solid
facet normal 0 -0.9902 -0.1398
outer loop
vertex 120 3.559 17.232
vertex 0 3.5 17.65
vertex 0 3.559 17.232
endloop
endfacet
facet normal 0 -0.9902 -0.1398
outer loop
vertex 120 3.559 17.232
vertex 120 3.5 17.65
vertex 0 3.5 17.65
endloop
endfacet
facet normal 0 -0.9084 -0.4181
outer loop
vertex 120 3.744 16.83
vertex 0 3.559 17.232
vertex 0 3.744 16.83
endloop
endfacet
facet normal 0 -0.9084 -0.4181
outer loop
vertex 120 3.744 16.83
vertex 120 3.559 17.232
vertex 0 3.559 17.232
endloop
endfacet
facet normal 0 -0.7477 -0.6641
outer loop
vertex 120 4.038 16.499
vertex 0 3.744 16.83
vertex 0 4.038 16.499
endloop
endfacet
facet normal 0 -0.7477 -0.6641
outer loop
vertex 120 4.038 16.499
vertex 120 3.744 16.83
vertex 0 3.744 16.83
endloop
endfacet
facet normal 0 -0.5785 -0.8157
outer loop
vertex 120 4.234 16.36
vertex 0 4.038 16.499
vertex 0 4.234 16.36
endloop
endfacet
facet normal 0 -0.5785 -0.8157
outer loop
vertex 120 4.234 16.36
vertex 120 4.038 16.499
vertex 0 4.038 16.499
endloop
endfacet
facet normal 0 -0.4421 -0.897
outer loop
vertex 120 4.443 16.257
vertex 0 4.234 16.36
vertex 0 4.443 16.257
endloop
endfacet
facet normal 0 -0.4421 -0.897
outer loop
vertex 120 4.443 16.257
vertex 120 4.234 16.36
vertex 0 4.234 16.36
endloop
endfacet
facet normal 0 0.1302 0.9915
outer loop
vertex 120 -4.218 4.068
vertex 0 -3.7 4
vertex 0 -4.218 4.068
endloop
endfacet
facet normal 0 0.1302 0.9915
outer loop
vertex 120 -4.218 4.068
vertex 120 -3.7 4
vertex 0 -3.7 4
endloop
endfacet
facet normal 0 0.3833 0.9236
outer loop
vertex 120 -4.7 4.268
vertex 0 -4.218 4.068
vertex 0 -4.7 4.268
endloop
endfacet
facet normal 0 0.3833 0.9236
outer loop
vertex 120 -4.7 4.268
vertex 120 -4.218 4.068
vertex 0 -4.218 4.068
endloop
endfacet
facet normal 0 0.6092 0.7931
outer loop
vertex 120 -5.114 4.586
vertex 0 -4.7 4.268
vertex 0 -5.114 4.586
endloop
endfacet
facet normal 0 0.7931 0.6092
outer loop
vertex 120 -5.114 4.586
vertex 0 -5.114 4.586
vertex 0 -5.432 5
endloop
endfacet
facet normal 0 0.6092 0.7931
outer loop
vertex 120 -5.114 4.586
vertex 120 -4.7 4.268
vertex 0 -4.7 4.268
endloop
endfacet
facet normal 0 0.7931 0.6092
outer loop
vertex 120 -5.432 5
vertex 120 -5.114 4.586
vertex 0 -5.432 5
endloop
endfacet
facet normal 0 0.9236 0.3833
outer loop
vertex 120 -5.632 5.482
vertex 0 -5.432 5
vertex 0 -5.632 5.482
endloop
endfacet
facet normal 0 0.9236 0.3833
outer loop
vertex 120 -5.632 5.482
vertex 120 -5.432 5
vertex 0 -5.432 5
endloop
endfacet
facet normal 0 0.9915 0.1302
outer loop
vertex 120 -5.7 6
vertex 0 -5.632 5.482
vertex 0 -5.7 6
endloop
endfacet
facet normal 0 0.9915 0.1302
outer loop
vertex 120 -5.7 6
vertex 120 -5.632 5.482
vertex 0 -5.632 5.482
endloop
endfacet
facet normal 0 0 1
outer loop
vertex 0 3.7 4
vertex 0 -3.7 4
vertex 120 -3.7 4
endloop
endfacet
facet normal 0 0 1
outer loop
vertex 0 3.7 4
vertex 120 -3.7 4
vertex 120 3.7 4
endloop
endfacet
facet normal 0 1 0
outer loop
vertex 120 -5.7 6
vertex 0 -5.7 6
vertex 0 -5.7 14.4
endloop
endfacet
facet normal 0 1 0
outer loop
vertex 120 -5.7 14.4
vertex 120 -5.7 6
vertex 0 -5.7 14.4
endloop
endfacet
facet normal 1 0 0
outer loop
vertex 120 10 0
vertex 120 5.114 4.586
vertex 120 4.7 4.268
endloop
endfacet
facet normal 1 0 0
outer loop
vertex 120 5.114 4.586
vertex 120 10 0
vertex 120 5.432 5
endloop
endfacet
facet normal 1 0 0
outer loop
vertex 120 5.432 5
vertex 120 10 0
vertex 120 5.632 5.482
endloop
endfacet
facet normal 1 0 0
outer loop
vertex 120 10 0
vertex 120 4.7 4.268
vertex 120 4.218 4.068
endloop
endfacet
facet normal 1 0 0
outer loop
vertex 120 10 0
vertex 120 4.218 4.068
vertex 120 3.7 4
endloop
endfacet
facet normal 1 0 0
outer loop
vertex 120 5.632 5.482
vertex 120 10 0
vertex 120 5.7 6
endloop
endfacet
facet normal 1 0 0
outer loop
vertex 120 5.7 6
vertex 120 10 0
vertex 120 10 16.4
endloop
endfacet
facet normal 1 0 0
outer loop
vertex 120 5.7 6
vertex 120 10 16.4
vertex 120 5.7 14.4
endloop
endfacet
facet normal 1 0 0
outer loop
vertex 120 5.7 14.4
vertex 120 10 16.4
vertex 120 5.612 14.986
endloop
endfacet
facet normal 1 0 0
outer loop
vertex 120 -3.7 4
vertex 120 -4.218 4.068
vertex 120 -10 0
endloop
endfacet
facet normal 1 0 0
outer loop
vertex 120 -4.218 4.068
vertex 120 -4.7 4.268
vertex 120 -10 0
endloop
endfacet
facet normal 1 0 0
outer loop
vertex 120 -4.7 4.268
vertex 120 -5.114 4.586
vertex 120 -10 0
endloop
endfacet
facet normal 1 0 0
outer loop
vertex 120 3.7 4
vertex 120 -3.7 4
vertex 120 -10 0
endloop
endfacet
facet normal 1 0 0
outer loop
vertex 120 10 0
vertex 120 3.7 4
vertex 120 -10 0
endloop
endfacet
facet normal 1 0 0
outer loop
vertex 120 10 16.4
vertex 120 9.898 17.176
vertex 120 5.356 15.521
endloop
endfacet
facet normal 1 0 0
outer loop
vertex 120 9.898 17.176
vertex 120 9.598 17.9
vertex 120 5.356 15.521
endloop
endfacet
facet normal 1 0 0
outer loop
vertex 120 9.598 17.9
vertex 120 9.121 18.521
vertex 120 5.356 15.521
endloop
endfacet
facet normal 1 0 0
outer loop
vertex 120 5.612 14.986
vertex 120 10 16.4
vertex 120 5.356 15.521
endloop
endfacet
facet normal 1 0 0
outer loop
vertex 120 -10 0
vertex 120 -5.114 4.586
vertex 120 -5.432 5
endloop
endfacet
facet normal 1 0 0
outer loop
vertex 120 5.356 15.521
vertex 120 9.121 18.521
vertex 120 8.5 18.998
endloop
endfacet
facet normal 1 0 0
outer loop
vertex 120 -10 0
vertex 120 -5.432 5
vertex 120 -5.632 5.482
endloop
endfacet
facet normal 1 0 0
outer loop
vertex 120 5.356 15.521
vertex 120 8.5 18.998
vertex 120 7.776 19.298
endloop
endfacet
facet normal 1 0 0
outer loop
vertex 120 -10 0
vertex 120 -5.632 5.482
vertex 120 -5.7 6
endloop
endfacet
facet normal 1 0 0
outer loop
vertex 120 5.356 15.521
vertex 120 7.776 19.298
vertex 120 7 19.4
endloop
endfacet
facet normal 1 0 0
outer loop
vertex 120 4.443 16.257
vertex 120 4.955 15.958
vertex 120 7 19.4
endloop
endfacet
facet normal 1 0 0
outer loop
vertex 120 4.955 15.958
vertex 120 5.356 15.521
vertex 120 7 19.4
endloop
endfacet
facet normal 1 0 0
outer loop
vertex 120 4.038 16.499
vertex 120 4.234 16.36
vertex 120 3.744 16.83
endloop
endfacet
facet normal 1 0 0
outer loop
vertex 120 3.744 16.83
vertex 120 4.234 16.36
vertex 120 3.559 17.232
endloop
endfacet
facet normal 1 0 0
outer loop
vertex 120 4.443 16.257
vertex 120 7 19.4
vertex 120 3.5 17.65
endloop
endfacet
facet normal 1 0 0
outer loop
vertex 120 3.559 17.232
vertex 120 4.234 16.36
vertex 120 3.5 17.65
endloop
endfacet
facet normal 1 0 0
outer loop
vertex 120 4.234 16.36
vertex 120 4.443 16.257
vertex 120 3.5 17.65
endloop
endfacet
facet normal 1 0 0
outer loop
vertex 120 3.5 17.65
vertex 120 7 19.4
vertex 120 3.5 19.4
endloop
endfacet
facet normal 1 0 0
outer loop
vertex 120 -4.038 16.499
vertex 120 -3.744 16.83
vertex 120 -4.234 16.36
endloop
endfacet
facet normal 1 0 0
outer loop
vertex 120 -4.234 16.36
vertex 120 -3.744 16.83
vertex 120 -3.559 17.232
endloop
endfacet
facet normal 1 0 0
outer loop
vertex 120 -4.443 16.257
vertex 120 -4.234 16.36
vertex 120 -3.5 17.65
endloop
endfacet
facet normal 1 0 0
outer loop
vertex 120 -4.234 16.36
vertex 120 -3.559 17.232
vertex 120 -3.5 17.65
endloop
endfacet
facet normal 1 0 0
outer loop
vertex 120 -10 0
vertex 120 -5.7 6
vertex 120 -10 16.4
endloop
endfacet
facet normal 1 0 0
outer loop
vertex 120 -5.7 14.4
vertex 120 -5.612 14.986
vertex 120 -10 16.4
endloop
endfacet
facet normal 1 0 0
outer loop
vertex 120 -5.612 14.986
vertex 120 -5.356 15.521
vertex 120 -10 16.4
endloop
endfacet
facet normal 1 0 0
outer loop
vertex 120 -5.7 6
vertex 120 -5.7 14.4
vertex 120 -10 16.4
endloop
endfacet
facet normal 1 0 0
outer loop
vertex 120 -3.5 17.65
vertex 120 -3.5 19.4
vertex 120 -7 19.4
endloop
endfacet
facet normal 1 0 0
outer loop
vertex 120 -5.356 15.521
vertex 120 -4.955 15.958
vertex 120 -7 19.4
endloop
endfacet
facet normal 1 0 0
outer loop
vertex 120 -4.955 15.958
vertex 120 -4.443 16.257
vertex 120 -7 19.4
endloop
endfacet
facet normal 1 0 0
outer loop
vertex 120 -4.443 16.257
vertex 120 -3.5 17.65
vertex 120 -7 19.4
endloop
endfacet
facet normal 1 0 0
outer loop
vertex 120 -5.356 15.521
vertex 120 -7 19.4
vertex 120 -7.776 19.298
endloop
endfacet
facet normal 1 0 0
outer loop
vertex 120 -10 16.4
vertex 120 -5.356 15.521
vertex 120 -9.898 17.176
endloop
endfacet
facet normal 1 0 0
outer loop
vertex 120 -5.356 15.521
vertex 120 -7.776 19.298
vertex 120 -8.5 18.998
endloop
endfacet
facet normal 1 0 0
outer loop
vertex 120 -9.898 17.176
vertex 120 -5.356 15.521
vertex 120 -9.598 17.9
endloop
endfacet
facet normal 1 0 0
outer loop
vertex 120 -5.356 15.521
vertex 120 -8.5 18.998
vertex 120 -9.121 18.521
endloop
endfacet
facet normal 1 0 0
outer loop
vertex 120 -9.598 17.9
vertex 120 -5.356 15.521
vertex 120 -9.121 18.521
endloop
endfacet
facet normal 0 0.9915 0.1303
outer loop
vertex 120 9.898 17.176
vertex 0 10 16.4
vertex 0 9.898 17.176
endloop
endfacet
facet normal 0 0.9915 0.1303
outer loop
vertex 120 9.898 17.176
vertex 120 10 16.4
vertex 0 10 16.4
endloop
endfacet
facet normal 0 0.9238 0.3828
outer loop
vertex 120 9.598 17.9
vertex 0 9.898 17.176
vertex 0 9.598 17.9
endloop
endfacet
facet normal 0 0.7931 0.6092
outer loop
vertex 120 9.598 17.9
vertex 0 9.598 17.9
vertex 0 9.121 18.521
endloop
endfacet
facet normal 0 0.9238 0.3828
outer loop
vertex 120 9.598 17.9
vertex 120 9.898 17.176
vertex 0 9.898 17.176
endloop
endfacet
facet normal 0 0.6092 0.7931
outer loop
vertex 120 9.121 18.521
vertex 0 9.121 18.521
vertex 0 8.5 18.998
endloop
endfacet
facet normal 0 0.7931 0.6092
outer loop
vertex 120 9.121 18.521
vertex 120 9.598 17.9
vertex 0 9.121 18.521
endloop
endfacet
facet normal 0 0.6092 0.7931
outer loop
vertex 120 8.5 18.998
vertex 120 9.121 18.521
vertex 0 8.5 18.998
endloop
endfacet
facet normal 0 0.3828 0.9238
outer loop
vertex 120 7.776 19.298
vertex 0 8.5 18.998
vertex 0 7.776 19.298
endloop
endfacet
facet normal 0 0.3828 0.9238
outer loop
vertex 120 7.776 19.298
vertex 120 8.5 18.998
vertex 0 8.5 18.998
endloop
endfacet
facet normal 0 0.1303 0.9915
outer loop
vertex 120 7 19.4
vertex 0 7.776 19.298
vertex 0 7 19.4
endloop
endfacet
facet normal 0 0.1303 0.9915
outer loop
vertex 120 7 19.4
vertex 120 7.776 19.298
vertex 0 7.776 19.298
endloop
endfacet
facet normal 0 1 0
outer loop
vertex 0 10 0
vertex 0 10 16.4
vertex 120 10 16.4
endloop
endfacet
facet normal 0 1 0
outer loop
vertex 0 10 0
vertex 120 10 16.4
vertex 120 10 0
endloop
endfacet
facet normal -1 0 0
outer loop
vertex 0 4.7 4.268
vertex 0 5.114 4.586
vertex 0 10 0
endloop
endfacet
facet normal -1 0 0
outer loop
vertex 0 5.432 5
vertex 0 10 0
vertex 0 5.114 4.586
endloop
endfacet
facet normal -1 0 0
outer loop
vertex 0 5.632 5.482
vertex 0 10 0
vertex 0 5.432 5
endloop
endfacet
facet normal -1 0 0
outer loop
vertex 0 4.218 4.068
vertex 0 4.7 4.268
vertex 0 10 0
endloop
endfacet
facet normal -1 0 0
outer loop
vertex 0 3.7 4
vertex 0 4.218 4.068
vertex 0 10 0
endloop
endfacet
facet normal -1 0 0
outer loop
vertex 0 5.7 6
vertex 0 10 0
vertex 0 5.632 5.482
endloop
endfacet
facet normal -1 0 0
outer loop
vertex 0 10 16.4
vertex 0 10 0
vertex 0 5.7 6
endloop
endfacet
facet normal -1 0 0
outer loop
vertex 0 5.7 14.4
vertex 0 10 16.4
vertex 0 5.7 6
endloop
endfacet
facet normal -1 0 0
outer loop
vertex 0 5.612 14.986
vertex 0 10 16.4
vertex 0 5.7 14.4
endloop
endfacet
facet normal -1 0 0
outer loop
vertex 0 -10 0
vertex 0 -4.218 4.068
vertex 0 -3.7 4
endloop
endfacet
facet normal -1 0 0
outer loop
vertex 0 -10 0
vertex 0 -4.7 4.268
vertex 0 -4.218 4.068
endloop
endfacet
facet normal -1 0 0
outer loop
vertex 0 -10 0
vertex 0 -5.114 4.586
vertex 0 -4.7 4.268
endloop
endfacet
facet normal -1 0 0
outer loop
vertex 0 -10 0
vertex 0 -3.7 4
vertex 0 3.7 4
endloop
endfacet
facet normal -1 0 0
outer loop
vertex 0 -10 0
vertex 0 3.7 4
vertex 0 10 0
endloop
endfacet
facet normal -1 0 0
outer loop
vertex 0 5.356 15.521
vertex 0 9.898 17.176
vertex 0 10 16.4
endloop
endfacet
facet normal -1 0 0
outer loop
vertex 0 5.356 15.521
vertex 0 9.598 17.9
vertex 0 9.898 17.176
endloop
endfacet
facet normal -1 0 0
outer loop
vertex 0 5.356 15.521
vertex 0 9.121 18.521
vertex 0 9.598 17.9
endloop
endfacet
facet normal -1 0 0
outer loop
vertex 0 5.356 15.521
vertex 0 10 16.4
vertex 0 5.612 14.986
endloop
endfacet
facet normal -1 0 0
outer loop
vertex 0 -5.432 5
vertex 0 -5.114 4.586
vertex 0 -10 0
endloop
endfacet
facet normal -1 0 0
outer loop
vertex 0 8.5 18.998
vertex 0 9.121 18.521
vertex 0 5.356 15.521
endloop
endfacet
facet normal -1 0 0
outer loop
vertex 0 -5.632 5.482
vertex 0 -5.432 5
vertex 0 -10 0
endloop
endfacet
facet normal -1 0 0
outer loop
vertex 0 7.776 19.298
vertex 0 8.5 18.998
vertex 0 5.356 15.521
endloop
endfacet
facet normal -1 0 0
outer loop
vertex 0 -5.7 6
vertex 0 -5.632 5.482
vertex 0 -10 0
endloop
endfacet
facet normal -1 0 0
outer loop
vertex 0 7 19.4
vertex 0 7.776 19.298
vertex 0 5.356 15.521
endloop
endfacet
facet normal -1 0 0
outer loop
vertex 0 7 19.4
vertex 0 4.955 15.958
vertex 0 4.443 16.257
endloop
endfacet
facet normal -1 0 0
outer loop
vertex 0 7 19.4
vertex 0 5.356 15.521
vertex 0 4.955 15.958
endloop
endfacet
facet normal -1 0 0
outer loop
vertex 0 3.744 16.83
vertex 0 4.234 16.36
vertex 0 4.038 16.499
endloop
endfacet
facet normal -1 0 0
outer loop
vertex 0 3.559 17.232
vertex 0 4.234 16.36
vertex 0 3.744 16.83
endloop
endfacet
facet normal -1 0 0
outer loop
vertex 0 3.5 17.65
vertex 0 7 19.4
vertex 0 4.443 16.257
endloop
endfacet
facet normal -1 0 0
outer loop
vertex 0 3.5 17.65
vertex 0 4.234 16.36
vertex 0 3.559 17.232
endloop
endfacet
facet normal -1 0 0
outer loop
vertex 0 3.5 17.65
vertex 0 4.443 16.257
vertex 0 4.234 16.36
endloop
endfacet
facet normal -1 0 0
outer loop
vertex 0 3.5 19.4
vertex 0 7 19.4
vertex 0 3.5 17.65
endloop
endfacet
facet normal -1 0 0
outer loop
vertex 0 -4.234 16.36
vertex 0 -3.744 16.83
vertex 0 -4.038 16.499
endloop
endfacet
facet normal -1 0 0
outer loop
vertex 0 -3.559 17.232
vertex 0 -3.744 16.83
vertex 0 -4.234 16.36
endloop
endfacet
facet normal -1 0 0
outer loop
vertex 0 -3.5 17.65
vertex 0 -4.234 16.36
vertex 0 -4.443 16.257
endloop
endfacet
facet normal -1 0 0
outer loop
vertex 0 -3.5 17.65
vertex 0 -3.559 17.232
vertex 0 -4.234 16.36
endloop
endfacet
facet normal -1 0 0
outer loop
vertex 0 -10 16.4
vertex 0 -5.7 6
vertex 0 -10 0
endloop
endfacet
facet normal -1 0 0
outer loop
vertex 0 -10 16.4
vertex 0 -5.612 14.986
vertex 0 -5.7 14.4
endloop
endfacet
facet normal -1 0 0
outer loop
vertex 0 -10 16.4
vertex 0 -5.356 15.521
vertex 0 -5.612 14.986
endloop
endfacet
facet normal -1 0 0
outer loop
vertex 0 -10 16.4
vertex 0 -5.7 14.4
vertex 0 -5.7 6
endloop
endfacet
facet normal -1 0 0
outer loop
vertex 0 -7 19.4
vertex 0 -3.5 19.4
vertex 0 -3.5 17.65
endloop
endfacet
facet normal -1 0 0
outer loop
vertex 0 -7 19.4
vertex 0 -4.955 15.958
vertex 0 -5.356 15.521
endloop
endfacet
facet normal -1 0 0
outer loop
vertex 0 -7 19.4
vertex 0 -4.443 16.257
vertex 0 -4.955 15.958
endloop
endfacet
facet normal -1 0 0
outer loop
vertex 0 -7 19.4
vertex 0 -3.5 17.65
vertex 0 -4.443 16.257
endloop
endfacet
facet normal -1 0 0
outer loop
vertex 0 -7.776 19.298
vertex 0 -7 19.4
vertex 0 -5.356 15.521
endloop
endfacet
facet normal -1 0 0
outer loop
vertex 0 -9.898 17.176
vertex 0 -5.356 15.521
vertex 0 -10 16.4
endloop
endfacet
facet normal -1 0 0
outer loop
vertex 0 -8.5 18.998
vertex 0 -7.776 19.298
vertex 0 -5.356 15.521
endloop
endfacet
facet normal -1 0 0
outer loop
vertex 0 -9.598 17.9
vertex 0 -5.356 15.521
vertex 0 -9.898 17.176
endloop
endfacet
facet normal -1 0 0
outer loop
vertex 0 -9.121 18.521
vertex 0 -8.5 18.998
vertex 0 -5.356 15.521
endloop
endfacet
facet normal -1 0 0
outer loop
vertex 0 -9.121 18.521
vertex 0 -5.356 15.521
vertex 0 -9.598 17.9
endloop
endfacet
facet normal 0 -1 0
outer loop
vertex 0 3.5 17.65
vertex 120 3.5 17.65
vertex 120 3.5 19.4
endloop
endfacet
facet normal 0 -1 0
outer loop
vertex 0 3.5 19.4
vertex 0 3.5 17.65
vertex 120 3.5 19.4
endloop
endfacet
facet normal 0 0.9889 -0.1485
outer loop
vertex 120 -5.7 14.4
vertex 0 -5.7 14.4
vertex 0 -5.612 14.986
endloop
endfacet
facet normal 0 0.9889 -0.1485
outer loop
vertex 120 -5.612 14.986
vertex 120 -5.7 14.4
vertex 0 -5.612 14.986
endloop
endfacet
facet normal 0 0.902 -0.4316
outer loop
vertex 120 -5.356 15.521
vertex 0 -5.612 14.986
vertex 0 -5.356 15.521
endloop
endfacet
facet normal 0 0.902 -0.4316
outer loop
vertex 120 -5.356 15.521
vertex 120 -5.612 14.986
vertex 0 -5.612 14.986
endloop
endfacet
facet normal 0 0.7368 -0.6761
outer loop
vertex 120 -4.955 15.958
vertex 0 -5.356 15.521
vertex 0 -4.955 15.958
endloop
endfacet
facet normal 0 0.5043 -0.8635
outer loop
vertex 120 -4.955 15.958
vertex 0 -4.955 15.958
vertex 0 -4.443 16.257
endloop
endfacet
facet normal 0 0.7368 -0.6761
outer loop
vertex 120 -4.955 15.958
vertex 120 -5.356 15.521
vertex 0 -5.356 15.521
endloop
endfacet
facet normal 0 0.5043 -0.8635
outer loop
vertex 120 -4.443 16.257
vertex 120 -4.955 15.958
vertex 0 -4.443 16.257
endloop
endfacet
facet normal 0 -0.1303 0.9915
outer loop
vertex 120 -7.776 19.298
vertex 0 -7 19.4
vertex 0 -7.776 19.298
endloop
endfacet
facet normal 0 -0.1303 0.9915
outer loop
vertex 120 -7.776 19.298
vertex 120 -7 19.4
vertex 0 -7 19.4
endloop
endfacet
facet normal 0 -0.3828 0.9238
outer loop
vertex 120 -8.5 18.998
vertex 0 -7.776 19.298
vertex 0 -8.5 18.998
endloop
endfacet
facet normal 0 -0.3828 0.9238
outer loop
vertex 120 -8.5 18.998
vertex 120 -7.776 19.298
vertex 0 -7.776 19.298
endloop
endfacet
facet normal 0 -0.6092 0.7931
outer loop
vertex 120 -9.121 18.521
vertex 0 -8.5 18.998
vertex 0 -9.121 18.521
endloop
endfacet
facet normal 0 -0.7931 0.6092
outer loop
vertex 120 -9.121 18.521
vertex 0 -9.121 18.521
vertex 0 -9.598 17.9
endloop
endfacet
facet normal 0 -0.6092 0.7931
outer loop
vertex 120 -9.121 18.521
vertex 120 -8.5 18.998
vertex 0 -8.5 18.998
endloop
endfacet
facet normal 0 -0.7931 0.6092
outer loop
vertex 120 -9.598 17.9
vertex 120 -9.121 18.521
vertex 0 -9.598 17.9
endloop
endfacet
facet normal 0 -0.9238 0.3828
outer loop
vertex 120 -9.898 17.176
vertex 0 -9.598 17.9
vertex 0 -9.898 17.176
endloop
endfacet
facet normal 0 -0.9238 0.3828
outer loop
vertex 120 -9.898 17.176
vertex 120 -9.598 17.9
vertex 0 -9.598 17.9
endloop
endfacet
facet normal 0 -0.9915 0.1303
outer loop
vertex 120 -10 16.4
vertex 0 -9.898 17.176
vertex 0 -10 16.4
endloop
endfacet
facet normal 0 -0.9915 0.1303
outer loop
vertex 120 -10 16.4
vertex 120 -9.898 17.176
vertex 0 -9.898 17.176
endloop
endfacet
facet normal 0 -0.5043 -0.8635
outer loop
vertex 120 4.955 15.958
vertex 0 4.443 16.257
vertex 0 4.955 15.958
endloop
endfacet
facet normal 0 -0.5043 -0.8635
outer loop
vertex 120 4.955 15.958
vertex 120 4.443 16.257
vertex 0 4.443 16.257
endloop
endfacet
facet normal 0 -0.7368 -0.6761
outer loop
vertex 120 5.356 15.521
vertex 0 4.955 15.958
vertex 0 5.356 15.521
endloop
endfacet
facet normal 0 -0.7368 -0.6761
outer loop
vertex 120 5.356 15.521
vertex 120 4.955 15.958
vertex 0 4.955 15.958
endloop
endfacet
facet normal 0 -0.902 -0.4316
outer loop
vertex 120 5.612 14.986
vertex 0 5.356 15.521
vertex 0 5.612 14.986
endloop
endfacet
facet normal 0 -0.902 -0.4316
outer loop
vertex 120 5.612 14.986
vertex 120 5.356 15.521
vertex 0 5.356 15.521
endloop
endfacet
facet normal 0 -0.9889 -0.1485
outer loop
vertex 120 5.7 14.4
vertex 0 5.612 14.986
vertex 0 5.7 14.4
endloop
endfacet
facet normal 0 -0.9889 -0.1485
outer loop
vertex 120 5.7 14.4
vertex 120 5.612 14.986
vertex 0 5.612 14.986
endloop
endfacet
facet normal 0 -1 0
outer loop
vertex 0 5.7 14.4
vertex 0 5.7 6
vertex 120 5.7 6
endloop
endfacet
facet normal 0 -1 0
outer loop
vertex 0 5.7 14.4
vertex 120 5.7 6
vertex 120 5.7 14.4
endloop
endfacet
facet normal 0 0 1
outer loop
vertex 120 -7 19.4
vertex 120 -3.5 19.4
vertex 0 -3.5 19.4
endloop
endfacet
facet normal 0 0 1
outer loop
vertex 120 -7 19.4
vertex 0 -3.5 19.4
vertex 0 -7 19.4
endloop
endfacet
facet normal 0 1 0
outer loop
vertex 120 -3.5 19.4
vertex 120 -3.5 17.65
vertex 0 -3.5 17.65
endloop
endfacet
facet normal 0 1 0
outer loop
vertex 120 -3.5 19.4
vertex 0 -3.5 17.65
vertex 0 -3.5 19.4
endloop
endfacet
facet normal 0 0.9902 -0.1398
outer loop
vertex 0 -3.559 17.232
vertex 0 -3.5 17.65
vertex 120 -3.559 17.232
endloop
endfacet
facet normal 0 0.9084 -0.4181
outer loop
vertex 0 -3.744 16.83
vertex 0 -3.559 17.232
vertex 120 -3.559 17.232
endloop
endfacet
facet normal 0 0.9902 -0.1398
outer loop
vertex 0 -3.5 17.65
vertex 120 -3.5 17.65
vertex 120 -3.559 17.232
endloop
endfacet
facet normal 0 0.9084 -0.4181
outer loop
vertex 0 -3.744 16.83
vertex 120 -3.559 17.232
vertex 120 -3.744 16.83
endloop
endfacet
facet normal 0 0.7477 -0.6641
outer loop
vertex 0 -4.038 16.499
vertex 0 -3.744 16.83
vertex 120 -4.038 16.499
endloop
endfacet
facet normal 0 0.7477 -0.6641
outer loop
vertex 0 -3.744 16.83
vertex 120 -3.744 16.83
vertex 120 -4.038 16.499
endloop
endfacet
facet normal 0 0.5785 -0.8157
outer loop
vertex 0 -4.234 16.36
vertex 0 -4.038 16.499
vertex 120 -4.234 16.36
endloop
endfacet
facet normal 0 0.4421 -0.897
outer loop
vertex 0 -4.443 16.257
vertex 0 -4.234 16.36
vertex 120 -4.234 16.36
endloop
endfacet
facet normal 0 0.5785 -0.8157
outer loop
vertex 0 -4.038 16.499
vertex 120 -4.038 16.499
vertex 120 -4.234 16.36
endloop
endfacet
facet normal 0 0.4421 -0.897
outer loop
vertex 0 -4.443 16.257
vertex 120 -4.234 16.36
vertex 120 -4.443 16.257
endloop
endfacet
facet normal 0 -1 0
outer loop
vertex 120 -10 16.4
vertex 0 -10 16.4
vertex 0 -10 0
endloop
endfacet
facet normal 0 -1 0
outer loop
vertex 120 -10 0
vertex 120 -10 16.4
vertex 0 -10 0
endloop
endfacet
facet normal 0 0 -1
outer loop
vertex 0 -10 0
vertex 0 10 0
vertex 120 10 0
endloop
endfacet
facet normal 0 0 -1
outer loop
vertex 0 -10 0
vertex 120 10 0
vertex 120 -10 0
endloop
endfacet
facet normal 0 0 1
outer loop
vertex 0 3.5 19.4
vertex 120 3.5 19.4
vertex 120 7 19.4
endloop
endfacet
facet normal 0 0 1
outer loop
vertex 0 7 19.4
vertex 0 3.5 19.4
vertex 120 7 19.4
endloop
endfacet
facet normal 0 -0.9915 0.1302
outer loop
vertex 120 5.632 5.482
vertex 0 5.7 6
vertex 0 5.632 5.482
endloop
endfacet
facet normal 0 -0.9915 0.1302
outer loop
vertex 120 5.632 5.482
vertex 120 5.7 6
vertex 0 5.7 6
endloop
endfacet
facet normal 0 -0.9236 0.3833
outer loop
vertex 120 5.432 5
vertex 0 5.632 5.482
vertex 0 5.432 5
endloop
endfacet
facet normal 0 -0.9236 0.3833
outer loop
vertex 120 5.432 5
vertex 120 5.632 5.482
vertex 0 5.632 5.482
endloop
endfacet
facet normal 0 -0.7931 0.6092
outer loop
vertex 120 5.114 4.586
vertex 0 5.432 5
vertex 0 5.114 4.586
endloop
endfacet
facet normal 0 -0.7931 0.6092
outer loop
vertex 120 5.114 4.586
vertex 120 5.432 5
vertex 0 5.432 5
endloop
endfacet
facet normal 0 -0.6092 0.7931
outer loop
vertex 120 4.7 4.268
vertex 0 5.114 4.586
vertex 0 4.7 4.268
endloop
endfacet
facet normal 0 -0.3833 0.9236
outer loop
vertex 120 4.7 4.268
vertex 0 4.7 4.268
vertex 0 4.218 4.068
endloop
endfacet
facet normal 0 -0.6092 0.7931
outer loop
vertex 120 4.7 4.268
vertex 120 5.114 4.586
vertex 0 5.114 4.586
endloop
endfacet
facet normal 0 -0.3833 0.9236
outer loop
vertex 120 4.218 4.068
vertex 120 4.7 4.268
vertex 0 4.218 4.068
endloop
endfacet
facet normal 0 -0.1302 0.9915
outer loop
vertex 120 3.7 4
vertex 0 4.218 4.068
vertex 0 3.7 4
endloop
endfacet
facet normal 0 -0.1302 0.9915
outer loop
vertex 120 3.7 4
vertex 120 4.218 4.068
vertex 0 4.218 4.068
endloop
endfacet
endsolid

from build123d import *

# Parameters (mm, degrees)
F1_DEPTH = 120
F3_R     = 2
F4_R     = 3
F5_R     = 1.5


with BuildPart() as f1:
    # F0 (on Right) → F1 (new body)
    with BuildSketch(Plane.YZ):
        Polygon((-10, 19.4), (-10, 0), (0, 0), (0, 4), (-5.7, 4), (-5.7, 16.4), (-3.5, 16.4), (-3.5, 19.4), align=None)
    extrude(amount=F1_DEPTH)

    # F2: F1 across plane


with BuildPart() as f1_1:
    add(f1.part)
    add(f1.part.mirror(Plane.XZ))

    # F3
    f3_edges = [f1_1.edges().sort_by_distance(p)[0] for p in [
        (60, -5.7, 16.4),
        (60, -5.7, 4),
        (60, 5.7, 4),
        (60, 5.7, 16.4),
    ]]
    fillet(f3_edges, radius=F3_R)

    # F4
    f4_edges = [f1_1.edges().sort_by_distance(p)[0] for p in [
        (60, -10, 19.4),
        (60, 10, 19.4),
    ]]
    fillet(f4_edges, radius=F4_R)

    # F5
    f5_edges = [f1_1.edges().sort_by_distance(p)[0] for p in [
        (60, -3.5, 16.4),
        (60, 3.5, 16.4),
    ]]
    fillet(f5_edges, radius=F5_R)


solid = f1_1.part
